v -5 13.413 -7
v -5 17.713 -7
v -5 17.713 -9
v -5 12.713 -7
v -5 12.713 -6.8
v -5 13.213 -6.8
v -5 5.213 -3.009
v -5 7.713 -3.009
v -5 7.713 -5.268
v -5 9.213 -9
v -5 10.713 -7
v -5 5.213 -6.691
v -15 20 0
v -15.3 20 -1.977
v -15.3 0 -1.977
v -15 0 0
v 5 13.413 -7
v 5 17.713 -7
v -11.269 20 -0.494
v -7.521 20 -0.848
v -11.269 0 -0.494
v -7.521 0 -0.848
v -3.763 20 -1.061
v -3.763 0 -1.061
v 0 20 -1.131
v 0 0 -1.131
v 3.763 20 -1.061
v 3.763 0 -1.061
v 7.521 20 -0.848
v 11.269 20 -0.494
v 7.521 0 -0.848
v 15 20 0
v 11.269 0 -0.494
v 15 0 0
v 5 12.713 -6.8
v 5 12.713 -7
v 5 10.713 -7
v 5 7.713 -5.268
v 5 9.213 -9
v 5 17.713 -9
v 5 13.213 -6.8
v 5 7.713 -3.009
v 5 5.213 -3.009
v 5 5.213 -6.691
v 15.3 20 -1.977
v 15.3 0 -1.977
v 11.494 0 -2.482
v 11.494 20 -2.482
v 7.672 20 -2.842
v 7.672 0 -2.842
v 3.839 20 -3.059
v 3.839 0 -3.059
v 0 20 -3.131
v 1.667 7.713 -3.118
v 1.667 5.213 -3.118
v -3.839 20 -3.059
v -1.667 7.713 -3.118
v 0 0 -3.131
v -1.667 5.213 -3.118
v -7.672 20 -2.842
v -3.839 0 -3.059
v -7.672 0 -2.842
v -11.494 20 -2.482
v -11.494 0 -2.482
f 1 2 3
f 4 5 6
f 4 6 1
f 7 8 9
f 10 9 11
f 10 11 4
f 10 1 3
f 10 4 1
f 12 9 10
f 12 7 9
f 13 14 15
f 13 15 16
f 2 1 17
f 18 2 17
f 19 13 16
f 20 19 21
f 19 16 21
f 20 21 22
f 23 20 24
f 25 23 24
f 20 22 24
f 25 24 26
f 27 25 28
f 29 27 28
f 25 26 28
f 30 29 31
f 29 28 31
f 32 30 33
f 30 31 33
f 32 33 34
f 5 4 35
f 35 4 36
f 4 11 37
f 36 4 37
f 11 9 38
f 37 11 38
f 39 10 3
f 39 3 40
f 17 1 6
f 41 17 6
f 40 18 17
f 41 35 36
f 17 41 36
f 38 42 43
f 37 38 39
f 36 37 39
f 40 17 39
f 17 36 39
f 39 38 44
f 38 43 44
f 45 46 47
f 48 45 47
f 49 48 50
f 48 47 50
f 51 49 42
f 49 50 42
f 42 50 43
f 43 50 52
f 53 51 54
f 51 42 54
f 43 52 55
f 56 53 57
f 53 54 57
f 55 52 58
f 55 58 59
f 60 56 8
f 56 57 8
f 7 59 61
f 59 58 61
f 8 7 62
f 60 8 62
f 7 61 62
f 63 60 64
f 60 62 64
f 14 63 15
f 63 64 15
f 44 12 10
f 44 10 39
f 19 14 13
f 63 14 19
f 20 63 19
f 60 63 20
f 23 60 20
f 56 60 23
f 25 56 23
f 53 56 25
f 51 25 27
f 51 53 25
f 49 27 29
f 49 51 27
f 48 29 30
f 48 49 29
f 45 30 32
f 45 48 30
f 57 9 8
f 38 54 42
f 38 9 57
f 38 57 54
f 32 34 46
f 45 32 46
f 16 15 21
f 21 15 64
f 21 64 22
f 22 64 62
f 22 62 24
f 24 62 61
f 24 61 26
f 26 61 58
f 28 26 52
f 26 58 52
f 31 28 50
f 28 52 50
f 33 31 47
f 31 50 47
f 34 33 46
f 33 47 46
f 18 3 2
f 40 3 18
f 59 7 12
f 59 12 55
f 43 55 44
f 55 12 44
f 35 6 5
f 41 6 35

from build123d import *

# Parameters (mm, degrees)
BOSS_EXTRUDE1_DEPTH      = 20
BOSS_EXTRUDE2_REACH      = 36.375
BOSS_EXTRUDE2_END_RADIUS = 102
BOSS_EXTRUDE2_START      = -9
SKETCH3_W                = 10
SKETCH3_H                = 2.5
SKETCH4_W                = 10
SKETCH4_H                = 2
BOSS_EXTRUDE3_DEPTH      = 10
CHAMFER2_SIZE            = 3
CHAMFER2_SIZE2           = 1.732050808
CHAMFER1_SIZE            = 4
CHAMFER1_SIZE2           = 2.309401077
SKETCH6_W                = 10
SKETCH6_H                = 1
BOSS_EXTRUDE4_DEPTH      = 0.2
CHAMFER3_SIZE            = 0.5


with BuildPart() as part:
    # Sketch2 → Boss-Extrude1 (new body)
    with BuildSketch(Plane(origin=(0, 0, 0), x_dir=(1, 0, 0), z_dir=(0, 1, 0))):
        with BuildLine():
            Line((-15.3, 1.977371993), (-15, 0))
            ThreePointArc((-15, 0), (0, 1.131400334), (15, 0))
            Line((15, 0), (15.3, 1.977371993))
            ThreePointArc((15.3, 1.977371993), (0, 3.131400334), (-15.3, 1.977371993))
        make_face()
    extrude(amount=BOSS_EXTRUDE1_DEPTH)

    # Boss-Extrude2: up to this cylinder (the profile starts outside it)
    boss_extrude2_end = Plane(origin=(0, 6.463137, 98.868599666), z_dir=(0, -1, 0)) * Cylinder(BOSS_EXTRUDE2_END_RADIUS, 277.75, mode=Mode.PRIVATE)
    # Sketch3 → Boss-Extrude2 (add, up to the surface)
    with BuildSketch(Plane.XY.offset(BOSS_EXTRUDE2_START), mode=Mode.PRIVATE) as boss_extrude2_sk1:
        with Locations((0, 6.463137396)):
            Rectangle(SKETCH3_W, SKETCH3_H)
    boss_extrude2_tool1 = extrude(boss_extrude2_sk1.sketch, amount=BOSS_EXTRUDE2_REACH, mode=Mode.PRIVATE) - boss_extrude2_end
    add(boss_extrude2_tool1.solids().sort_by_distance((0, 6.463137, -9))[0])

    # Sketch4 → Boss-Extrude3 (add)
    with BuildSketch(Plane(origin=(0, 7.713137396, 0), x_dir=(1, 0, 0), z_dir=(0, 1, 0))):
        with Locations((0, 8)):
            Rectangle(SKETCH4_W, SKETCH4_H)
    extrude(amount=BOSS_EXTRUDE3_DEPTH)

    # Chamfer2
    chamfer2_edges = [part.edges().sort_by_distance(p)[0] for p in [
        (0, 7.713137396, -7),
    ]]
    chamfer2_side = [part.faces().sort_by_distance(p)[0] for p in [
        (0, 12.713137396, -7),
    ]]
    chamfer(chamfer2_edges, length=CHAMFER2_SIZE, length2=CHAMFER2_SIZE2, reference=chamfer2_side[0])

    # Chamfer1
    chamfer1_edges = [part.edges().sort_by_distance(p)[0] for p in [
        (0, 5.213137396, -9),
    ]]
    chamfer1_side = [part.faces().sort_by_distance(p)[0] for p in [
        (0, 11.463137396, -9),
    ]]
    chamfer(chamfer1_edges, length=CHAMFER1_SIZE, length2=CHAMFER1_SIZE2, reference=chamfer1_side[0])

    # Sketch6 → Boss-Extrude4 (add)
    with BuildSketch(Plane.XY.offset(-7)):
        with Locations((0, 13.213137396)):
            Rectangle(SKETCH6_W, SKETCH6_H)
    extrude(amount=BOSS_EXTRUDE4_DEPTH)

    # Chamfer3
    # the kernel refuses this chamfer: 0.5 mm, written as the material it takes off along each edge
    with BuildSketch(Plane(origin=(-6.285841494, 13.713137396, -6.8), x_dir=(0, 0.027495876610585647, -0.9996219169112968), z_dir=(1, 0, 0))) as chamfer3_piece_1_section:
        Polygon((CHAMFER3_SIZE * 0.999621916911, -CHAMFER3_SIZE * 0.0274958766106), (-CHAMFER3_SIZE * 0.0274958766106, -CHAMFER3_SIZE * 0.999621916911), (0, 0), align=None)
    chamfer3_piece_1 = extrude(amount=12.571682988, mode=Mode.PRIVATE)
    chamfer3_piece_1 = split(chamfer3_piece_1, bisect_by=Plane(origin=(0, 13.506192151, -7), z_dir=(0, 0, 1)), keep=Keep.TOP, mode=Mode.PRIVATE)
    add(chamfer3_piece_1, mode=Mode.SUBTRACT)


solid = part.part
